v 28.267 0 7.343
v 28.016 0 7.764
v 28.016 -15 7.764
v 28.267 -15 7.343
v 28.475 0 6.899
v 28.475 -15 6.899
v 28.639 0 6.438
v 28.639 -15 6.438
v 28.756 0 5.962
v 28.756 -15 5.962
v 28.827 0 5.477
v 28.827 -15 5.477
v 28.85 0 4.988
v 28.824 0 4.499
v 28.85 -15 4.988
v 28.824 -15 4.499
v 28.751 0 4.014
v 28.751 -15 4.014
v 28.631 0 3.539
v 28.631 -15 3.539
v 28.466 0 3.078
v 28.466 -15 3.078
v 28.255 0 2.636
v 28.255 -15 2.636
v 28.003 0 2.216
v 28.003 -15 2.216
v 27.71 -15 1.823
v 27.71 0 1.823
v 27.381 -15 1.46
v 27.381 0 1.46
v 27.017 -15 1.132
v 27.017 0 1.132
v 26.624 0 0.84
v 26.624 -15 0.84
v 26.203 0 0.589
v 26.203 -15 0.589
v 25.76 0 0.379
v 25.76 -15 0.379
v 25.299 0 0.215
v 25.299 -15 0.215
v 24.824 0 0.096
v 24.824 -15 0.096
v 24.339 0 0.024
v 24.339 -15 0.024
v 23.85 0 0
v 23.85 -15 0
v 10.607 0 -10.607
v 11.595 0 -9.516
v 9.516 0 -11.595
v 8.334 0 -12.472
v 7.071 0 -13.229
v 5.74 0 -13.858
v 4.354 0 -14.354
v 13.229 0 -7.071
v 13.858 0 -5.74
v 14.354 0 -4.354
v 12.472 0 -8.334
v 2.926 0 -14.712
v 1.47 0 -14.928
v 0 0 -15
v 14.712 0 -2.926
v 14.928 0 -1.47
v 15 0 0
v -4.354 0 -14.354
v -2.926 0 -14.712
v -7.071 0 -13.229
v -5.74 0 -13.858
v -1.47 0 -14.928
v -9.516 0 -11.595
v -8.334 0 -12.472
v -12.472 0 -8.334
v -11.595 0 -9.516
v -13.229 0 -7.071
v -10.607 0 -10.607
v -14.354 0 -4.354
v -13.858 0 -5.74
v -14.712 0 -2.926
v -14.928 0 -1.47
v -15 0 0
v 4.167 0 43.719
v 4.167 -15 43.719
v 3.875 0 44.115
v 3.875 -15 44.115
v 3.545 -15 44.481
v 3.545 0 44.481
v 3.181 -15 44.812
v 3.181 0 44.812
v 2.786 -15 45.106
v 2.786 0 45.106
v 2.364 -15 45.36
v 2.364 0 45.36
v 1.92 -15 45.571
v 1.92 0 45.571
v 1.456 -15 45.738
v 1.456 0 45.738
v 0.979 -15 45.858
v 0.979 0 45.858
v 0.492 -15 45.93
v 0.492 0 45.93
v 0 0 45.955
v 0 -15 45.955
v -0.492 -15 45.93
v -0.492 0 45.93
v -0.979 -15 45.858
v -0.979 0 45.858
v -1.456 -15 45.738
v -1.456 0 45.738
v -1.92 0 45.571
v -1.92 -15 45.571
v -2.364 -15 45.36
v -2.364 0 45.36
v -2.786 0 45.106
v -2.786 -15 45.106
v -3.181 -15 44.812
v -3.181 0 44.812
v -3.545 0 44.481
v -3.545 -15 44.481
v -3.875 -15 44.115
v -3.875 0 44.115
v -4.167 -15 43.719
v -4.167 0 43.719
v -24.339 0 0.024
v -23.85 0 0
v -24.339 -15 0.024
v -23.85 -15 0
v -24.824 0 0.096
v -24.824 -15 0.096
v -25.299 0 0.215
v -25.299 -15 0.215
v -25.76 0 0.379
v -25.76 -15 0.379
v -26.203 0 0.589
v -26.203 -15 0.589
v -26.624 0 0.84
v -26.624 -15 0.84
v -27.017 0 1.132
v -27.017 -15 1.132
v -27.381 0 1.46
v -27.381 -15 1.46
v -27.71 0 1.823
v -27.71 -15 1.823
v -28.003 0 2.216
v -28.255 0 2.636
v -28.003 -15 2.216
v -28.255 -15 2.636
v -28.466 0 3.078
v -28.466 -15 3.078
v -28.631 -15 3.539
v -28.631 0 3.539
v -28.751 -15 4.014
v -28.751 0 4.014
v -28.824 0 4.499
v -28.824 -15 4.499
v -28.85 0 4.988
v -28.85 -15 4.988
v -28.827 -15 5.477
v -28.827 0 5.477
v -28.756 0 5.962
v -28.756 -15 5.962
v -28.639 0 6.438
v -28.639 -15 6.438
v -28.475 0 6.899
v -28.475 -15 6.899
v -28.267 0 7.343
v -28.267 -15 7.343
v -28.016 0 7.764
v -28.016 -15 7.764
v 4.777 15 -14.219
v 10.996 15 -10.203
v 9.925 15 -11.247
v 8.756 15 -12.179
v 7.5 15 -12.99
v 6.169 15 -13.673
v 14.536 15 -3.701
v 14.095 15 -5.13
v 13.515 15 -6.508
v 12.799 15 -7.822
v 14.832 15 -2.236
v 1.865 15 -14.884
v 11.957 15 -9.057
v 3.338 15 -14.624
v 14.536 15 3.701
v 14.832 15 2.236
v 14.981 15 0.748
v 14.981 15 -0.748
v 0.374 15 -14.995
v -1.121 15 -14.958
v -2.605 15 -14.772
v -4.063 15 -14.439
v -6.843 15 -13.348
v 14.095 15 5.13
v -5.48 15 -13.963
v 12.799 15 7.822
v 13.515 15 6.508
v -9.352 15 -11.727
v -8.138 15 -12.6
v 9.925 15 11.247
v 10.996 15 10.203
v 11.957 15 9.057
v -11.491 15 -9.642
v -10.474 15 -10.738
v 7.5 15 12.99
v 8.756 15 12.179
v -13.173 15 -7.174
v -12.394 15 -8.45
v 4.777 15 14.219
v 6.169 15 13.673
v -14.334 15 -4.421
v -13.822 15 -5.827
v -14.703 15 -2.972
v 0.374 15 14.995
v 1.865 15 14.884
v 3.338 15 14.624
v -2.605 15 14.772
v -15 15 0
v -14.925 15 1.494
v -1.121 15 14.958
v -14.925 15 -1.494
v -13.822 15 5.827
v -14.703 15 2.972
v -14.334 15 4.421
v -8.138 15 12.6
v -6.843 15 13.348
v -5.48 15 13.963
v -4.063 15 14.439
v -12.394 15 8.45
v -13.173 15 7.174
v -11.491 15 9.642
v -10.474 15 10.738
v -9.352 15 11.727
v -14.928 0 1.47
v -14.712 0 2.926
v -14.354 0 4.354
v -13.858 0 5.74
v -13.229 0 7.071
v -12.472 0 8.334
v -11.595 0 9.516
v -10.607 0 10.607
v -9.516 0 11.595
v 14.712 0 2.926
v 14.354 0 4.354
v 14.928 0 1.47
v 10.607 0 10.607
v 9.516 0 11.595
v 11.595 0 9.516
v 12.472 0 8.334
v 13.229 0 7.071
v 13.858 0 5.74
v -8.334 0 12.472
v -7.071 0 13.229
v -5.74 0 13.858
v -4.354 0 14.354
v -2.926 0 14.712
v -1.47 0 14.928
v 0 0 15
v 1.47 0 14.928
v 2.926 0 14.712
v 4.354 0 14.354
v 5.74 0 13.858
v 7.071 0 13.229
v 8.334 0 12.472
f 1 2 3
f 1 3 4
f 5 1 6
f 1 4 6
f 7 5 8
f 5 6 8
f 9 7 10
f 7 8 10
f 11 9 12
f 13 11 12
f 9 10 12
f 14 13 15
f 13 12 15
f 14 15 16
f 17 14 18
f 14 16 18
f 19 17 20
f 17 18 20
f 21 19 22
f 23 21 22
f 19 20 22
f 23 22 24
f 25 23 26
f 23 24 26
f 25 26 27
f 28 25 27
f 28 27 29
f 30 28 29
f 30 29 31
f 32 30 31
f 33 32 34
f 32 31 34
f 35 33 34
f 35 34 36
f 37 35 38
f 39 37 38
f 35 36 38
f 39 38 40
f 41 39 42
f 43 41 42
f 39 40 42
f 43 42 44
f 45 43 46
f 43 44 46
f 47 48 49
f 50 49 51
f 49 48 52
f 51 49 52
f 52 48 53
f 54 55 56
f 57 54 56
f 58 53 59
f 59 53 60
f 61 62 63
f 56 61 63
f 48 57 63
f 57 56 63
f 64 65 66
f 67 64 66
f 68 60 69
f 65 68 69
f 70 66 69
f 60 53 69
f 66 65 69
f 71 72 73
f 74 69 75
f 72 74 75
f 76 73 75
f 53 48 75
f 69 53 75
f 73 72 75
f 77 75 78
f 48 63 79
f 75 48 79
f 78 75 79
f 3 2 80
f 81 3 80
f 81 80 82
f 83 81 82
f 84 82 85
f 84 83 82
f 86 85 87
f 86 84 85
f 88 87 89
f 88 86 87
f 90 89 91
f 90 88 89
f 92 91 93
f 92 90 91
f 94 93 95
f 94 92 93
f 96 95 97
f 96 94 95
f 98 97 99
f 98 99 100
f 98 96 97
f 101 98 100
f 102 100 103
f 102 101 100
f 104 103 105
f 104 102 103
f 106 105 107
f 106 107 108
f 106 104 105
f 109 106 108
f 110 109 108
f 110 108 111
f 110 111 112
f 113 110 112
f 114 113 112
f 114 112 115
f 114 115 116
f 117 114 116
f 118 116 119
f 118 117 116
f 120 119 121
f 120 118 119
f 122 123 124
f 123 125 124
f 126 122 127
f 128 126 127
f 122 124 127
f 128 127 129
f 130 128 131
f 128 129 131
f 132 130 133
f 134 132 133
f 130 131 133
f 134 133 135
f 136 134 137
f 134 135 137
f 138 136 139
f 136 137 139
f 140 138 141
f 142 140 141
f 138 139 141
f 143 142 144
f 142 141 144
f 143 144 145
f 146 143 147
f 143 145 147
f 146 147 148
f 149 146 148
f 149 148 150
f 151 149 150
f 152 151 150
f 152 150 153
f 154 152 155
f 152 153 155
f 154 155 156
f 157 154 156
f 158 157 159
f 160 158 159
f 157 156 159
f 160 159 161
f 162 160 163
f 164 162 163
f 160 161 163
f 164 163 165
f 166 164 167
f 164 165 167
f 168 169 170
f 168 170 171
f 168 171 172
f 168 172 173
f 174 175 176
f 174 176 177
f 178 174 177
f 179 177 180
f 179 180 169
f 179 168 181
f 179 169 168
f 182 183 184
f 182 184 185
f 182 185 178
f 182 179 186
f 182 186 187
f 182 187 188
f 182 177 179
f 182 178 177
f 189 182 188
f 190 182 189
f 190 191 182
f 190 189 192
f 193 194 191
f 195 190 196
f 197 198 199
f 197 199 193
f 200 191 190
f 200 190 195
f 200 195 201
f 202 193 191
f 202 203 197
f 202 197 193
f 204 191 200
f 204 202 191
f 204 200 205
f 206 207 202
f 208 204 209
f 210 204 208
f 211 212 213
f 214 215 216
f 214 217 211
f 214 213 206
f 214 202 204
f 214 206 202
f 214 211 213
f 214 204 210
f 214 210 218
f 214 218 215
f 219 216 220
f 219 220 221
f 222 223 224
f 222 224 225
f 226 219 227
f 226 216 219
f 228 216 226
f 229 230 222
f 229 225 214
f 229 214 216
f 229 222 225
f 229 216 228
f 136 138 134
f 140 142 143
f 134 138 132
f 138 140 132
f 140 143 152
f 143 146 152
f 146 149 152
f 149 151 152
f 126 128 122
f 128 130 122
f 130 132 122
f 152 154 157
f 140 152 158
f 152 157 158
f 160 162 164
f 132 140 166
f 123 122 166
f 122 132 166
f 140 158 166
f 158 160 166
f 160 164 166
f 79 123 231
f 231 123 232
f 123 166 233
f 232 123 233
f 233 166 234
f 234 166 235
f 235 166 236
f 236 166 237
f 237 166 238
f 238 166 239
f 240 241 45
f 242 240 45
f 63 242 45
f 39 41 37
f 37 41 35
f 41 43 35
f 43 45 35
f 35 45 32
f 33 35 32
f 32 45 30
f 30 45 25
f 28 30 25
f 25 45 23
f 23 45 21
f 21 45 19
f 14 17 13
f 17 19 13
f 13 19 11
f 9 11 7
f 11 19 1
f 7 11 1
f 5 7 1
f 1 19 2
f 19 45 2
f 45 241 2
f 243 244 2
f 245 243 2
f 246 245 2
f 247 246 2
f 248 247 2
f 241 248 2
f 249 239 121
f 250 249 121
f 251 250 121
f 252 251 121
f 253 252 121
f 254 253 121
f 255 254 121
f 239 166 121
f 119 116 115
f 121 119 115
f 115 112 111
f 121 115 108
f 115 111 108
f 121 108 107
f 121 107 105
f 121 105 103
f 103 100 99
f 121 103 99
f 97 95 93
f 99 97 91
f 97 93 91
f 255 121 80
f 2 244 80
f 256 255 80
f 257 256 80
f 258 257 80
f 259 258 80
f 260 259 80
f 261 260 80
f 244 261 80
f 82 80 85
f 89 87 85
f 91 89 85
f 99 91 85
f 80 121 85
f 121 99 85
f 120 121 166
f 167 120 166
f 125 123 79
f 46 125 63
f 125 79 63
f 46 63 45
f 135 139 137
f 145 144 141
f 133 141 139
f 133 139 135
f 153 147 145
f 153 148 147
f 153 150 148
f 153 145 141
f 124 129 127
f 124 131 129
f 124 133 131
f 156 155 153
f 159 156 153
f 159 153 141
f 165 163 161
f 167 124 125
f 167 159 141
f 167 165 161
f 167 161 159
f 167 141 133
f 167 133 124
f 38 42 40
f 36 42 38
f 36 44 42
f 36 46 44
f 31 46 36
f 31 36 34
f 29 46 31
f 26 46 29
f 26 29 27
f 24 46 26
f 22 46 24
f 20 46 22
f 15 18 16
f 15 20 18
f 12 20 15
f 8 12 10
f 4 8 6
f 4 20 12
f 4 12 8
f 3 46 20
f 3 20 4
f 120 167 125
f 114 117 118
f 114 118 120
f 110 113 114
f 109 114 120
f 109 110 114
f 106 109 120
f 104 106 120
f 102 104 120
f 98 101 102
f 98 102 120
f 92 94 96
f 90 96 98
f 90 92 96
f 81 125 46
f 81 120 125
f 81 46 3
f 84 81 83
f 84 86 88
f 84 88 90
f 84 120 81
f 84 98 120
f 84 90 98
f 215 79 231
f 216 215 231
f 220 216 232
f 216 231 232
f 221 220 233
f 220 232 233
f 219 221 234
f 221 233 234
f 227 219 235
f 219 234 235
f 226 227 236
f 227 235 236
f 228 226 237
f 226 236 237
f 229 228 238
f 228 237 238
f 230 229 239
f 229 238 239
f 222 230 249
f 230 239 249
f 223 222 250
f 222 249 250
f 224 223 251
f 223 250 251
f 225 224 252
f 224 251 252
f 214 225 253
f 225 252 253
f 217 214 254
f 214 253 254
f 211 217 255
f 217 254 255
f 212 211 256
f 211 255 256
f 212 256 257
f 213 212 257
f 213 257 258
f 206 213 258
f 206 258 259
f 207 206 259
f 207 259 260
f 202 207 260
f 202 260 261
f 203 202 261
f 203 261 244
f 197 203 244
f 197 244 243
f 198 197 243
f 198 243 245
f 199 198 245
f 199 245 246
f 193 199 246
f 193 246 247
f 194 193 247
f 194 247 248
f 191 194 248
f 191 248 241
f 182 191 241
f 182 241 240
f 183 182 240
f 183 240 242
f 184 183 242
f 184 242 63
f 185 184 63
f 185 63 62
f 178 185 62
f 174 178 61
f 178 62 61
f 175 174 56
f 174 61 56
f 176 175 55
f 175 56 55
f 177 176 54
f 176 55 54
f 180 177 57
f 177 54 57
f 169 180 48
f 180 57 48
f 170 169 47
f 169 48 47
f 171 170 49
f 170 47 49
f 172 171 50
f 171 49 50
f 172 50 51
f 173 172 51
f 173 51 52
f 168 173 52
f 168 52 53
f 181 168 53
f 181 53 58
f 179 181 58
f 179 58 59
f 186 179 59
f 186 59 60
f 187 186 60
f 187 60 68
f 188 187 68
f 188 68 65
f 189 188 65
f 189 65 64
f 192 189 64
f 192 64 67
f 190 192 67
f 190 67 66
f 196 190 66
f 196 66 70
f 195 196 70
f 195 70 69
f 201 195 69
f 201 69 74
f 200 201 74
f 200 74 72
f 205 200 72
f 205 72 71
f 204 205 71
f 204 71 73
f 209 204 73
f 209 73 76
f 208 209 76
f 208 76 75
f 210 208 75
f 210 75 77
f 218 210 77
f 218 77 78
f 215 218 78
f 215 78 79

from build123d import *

# Parameters (mm, degrees)
F1_DEPTH = 15
F2_R     = 15
F3_DEPTH = 15
F4_R     = 5
F5_R     = 5


with BuildPart() as f1:
    # F0 (on Front) → F1 (new body)
    with BuildSketch(Plane.XZ):
        Polygon((0, 50), (-33.166248, 0), (33.166248, 0), align=None)
    extrude(amount=F1_DEPTH)

    # F2 (on face) → F3 (join)
    with BuildSketch(Plane(origin=(0, 0, 0), x_dir=(-1, 0, 0), z_dir=(0, 1, 0))):
        Circle(F2_R)
    extrude(amount=F3_DEPTH)

    # F4
    f4_edges = [f1.edges().sort_by_distance(p)[0] for p in [
        (0, -7.5, 50),
    ]]
    fillet(f4_edges, radius=F4_R)

    # F5
    f5_edges = [f1.edges().sort_by_distance(p)[0] for p in [
        (33.166248, -7.5, 0),
        (-33.166248, -7.5, 0),
    ]]
    fillet(f5_edges, radius=F5_R)


solid = f1.part
